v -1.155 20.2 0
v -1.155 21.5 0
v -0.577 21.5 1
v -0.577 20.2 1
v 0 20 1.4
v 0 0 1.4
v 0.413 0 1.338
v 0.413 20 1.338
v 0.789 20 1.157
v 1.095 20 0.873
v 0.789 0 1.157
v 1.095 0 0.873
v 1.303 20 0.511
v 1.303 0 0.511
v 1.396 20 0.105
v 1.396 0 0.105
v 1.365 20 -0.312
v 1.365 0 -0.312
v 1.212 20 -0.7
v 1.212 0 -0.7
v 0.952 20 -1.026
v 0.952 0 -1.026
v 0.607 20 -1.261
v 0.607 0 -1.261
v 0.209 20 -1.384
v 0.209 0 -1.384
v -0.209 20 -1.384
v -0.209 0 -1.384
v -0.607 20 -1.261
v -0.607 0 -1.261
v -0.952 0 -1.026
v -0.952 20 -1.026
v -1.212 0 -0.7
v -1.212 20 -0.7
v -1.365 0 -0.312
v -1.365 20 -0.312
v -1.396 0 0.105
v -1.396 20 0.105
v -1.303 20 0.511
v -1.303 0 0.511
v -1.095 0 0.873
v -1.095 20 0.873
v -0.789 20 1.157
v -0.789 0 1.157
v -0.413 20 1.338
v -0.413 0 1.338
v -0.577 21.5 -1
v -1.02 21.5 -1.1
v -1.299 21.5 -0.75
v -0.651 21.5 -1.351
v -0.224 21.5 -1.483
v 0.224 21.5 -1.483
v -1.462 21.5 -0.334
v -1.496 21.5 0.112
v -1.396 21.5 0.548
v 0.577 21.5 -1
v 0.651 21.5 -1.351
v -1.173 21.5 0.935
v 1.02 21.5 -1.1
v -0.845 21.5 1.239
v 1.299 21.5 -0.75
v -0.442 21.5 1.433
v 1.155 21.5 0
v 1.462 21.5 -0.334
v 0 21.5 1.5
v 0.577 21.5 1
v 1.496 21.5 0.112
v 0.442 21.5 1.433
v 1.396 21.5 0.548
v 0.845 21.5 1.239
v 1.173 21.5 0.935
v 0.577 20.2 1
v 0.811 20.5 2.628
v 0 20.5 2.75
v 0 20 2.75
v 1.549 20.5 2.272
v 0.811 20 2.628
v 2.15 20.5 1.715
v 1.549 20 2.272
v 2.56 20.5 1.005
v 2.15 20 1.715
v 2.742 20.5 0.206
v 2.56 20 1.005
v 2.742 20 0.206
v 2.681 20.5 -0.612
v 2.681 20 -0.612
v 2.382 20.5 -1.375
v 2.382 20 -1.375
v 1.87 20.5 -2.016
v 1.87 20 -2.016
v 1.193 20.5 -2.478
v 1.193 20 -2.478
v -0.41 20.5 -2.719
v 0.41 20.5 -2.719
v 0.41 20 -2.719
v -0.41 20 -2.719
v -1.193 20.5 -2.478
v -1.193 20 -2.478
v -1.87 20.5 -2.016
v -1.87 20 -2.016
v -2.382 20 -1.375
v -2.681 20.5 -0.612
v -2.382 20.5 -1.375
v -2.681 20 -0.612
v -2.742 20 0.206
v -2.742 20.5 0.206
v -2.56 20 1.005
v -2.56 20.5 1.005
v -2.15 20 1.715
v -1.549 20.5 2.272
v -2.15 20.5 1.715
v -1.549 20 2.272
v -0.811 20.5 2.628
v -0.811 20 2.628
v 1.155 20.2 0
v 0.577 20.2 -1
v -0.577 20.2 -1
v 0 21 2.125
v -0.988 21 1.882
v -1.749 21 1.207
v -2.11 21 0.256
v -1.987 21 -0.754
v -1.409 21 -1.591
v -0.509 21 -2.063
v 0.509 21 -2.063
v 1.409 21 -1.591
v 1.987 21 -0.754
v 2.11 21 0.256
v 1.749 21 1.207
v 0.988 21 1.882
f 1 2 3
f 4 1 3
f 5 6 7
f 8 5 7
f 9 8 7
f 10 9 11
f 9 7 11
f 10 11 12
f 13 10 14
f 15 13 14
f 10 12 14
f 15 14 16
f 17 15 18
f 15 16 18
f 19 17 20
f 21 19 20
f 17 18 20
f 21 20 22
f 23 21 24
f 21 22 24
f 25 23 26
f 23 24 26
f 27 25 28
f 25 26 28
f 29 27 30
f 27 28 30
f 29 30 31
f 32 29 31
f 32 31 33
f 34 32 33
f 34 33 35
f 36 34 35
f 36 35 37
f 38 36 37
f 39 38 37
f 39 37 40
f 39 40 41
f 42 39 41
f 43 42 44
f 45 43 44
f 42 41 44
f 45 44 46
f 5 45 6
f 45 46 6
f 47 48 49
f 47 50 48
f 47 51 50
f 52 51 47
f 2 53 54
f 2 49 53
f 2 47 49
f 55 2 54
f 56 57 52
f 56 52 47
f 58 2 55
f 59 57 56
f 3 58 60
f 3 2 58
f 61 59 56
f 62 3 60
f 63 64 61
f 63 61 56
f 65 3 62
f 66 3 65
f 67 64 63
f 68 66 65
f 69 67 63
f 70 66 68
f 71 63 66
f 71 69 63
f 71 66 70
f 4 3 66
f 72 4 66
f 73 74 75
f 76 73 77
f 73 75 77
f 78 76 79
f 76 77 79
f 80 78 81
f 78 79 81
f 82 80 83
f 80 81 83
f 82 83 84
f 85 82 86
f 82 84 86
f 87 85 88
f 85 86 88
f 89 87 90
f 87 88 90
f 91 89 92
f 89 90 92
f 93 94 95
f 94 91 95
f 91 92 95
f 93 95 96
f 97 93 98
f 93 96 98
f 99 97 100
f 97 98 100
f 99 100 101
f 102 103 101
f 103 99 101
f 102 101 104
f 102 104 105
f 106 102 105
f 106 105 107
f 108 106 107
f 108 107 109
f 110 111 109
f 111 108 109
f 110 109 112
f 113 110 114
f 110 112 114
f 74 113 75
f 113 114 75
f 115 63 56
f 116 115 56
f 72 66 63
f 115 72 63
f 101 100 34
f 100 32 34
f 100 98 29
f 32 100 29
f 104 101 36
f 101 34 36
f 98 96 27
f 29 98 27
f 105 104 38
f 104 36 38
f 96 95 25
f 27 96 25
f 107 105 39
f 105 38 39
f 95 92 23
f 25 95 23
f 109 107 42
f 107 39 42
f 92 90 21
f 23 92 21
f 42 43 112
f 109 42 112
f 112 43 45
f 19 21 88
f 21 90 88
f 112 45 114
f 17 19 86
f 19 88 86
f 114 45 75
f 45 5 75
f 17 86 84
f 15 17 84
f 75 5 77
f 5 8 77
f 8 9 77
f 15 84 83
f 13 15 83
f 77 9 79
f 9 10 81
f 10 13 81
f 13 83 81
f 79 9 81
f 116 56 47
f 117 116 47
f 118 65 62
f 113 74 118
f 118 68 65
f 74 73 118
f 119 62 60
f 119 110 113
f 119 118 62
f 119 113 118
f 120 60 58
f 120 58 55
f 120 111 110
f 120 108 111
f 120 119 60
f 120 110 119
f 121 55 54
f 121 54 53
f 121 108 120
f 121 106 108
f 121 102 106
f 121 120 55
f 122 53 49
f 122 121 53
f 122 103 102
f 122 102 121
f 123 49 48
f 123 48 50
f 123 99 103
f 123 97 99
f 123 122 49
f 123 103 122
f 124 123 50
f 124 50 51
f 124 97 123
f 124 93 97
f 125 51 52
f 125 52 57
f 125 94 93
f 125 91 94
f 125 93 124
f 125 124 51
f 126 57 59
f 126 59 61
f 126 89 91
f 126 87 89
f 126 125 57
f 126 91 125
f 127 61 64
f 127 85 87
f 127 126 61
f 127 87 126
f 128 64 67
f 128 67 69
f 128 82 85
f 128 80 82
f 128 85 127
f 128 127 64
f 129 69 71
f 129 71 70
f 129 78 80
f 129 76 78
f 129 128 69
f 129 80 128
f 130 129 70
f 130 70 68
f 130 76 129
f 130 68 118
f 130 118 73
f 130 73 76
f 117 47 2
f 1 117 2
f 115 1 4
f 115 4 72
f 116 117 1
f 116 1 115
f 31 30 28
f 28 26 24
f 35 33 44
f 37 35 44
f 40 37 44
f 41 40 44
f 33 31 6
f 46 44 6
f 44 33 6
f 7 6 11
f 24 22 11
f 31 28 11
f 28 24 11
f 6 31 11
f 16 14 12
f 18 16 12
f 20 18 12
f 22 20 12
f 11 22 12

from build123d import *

# Parameters (mm, degrees)
SKETCH1_R           = 1.4
BOSS_EXTRUDE1_DEPTH = 20
SKETCH2_R           = 2.75
BOSS_EXTRUDE2_DEPTH = 1.5
CUT_EXTRUDE1_DEPTH  = 1.3


with BuildPart() as part:
    # Sketch1 → Boss-Extrude1 (new body)
    with BuildSketch(Plane(origin=(0, 0, 0), x_dir=(1, 0, 0), z_dir=(0, 1, 0))):
        with Locations(Location((0, 0, 0), (0, 0, 270))):
            Circle(SKETCH1_R)
    extrude(amount=BOSS_EXTRUDE1_DEPTH)

    # Sketch2 → Boss-Extrude2 (add)
    with BuildSketch(Plane(origin=(0, 20, 0), x_dir=(1, 0, 0), z_dir=(0, 1, 0))):
        with Locations(Location((0, 0, 0), (0, 0, 270))):
            Circle(SKETCH2_R)
    extrude(amount=BOSS_EXTRUDE2_DEPTH)

    # Sketch3 → Cut-Revolve1 (revolve, cut)
    with BuildSketch(Plane(origin=(0, 0, 0), x_dir=(0, 0, -1), z_dir=(1, 0, 0)), mode=Mode.PRIVATE) as cut_revolve1_sk:
        Polygon((1.5, 21.5), (2.75, 20.5), (2.75, 21.5), align=None)
    revolve(cut_revolve1_sk.sketch.rotate(Axis((0, 21.5, 0), (0, -1, 0)), 180), axis=Axis((0, 21.5, 0), (0, -1, 0)), mode=Mode.SUBTRACT)

    # Sketch4 → Cut-Extrude1 (cut)
    with BuildSketch(Plane(origin=(0, 21.5, 0), x_dir=(1, 0, 0), z_dir=(0, 1, 0))):
        Polygon((1.154700538, 0), (0.577350269, 1), (-0.577350269, 1), (-1.154700538, 0), (-0.577350269, -1), (0.577350269, -1), align=None)
    extrude(amount=-CUT_EXTRUDE1_DEPTH, mode=Mode.SUBTRACT)


solid = part.part
